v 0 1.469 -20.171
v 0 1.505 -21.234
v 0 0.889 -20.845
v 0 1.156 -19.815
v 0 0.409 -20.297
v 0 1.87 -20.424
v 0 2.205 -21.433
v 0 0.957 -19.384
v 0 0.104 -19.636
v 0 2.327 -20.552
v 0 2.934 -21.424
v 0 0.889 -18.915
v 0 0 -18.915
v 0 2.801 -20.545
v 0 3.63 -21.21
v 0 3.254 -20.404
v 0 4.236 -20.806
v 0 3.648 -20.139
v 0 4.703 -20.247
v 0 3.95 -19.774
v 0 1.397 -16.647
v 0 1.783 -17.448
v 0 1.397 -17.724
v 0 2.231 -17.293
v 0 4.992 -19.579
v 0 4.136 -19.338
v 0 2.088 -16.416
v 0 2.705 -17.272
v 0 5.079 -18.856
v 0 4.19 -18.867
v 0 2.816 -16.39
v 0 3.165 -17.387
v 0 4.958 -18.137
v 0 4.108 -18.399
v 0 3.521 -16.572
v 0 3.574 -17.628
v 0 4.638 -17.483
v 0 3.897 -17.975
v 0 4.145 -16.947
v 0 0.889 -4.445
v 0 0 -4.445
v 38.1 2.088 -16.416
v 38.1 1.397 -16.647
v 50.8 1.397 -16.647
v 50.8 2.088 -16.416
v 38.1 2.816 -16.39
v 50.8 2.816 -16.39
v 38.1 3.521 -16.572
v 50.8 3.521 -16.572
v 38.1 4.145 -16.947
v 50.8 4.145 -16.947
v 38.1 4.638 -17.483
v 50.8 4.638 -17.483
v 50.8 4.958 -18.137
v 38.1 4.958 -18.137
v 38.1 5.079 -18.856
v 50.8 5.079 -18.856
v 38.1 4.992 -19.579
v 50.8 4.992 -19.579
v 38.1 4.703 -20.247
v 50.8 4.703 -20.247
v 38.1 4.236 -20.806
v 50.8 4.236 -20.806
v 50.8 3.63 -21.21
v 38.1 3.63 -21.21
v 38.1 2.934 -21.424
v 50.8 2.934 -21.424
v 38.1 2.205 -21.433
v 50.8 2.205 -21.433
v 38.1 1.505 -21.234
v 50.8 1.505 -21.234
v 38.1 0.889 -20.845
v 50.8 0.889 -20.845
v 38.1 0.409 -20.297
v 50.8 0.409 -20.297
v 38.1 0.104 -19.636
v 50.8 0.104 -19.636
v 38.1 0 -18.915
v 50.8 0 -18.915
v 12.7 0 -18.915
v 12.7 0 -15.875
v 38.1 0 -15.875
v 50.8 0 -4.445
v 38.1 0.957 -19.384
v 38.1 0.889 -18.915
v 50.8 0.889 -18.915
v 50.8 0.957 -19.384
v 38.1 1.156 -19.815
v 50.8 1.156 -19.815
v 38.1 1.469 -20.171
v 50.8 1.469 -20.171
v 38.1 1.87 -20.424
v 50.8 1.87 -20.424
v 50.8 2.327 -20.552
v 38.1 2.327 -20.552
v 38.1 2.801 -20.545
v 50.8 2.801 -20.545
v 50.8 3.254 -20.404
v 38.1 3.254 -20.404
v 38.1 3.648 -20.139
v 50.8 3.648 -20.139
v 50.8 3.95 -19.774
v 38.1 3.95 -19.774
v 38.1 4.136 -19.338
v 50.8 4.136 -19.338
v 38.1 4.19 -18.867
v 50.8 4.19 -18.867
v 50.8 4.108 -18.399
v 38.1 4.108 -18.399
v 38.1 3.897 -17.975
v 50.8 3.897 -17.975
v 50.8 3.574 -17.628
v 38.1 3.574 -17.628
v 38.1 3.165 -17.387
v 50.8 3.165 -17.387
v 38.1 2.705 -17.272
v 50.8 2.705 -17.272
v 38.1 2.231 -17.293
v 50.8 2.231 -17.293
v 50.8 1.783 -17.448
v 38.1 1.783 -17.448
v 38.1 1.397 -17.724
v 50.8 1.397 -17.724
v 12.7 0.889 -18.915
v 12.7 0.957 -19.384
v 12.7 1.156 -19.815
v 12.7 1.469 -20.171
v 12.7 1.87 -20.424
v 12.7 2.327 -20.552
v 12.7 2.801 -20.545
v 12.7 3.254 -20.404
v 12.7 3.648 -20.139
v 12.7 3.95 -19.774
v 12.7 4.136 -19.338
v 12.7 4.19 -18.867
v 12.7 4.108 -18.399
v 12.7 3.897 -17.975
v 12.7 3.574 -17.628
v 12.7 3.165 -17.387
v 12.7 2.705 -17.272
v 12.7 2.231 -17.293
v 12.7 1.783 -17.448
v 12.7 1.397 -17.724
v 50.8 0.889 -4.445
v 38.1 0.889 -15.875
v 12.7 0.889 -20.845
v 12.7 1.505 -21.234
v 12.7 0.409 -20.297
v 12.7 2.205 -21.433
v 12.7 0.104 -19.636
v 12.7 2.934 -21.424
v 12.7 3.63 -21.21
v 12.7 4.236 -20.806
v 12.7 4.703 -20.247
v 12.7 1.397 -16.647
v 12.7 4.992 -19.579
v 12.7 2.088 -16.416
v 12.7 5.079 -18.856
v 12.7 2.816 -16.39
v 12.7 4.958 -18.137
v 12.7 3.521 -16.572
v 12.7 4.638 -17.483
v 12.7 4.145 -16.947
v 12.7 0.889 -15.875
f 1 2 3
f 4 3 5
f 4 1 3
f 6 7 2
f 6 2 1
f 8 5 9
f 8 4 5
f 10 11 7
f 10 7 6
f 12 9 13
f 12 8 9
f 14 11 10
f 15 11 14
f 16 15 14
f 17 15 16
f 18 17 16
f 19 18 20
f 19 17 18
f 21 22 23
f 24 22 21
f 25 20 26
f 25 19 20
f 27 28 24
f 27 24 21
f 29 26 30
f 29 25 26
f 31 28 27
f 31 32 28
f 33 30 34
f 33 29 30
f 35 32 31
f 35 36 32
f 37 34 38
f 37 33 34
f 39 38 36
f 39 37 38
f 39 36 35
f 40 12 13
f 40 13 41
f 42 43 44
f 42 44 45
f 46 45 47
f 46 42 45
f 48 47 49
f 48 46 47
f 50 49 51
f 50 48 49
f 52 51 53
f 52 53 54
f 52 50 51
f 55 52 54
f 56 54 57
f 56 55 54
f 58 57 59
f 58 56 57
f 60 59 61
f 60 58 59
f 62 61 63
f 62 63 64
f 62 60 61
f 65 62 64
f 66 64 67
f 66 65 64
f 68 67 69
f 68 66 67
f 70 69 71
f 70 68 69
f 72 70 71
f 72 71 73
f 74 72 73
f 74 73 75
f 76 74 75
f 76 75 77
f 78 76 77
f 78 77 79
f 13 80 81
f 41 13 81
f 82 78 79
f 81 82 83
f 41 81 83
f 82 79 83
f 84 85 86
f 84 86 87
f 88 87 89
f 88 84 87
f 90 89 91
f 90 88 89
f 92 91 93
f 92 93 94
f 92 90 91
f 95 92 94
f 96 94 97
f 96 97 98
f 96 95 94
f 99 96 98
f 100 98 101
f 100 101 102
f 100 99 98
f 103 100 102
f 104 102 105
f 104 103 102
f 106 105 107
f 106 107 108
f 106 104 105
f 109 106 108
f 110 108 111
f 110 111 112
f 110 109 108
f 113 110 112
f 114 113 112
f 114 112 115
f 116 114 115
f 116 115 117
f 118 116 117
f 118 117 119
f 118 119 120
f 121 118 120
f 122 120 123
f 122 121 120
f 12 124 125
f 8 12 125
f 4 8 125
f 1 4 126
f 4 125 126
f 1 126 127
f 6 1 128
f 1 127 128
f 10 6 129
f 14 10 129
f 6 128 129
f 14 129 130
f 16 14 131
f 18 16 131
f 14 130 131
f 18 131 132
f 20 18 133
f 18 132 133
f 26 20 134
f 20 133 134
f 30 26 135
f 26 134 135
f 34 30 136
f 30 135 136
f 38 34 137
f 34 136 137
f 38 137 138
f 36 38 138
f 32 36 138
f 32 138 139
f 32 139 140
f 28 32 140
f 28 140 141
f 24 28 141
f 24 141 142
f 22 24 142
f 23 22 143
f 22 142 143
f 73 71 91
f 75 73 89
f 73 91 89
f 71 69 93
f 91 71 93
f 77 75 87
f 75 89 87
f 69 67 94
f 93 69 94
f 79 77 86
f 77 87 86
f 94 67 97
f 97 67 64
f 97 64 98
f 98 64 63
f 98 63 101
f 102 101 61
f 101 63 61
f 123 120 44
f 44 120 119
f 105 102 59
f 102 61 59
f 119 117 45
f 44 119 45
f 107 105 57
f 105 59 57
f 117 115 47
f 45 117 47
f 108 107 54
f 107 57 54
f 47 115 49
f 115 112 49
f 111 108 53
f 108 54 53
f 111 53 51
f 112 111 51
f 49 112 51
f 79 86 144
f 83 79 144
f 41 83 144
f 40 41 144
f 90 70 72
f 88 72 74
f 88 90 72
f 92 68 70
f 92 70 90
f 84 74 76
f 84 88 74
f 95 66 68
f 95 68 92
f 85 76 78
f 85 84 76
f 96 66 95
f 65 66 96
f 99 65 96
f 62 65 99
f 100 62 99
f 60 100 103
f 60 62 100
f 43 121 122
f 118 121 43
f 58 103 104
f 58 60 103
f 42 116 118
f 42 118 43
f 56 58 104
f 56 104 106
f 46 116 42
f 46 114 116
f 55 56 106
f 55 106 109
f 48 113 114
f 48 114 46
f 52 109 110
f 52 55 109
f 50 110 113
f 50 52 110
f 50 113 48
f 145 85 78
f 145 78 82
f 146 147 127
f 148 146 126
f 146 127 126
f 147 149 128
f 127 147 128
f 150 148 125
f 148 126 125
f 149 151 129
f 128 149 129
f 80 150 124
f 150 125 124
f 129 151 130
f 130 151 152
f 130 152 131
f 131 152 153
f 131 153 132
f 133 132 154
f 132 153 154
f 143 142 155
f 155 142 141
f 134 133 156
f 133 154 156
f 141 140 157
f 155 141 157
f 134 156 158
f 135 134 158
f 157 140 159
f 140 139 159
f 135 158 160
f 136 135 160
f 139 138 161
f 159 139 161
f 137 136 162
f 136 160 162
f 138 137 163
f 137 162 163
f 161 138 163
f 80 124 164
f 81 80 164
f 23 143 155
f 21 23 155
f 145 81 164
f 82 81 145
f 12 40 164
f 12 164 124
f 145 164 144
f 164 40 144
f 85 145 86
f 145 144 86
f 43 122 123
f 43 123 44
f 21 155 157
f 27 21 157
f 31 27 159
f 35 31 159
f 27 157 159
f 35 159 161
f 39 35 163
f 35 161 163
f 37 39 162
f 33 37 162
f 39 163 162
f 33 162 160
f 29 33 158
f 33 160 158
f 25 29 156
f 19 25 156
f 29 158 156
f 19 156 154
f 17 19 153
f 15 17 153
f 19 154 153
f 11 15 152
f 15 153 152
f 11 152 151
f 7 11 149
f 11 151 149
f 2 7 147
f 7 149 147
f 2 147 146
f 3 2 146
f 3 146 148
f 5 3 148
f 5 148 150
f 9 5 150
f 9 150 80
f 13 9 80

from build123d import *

# Parameters (mm, degrees)
SKETCH1_W           = 50.8
SKETCH1_H           = 15.875
BOSS_EXTRUDE1_DEPTH = 0.889
SKETCH3_W           = 7.62
SKETCH3_H           = 12.7
CUT_EXTRUDE1_DEPTH  = 51.8
BOSS_EXTRUDE6_DEPTH = 12.7
BOSS_EXTRUDE7_START = -25.4
BOSS_EXTRUDE7_DEPTH = 12.7


with BuildPart() as part:
    # Sketch1 → Boss-Extrude1 (new body)
    with BuildSketch(Plane(origin=(0, 0, 0), x_dir=(1, 0, 0), z_dir=(0, 1, 0))):
        with Locations((25.4, 7.9375)):
            Rectangle(SKETCH1_W, SKETCH1_H)
    extrude(amount=BOSS_EXTRUDE1_DEPTH)

    # Sketch3 → Cut-Extrude1 (cut, through all)
    with BuildSketch(Plane(origin=(50.8, 0, 0), x_dir=(0, 0, -1), z_dir=(1, 0, 0))):
        with Locations((0.635, -0.009678267)):
            Rectangle(SKETCH3_W, SKETCH3_H)
    extrude(amount=-CUT_EXTRUDE1_DEPTH, mode=Mode.SUBTRACT)

    # Sketch4 → Boss-Extrude6 (add)
    with BuildSketch(Plane(origin=(38.1, 0, 0), x_dir=(0, 0, -1), z_dir=(1, 0, 0))):
        with BuildLine():
            Line((15.875, 0.889), (18.915054155, 0.889))
            ThreePointArc((18.915054155, 0.889), (19.562629634, 4.058699114), (17.723688552, 1.397))
            Line((17.723688552, 1.397), (16.646761626, 1.397))
            ThreePointArc((16.646761626, 1.397), (20.247041392, 4.702732068), (18.915054155, 0))
            Line((18.915054155, 0), (15.875, 0))
            Line((15.875, 0), (15.875, 0.889))
        make_face()
    extrude(amount=BOSS_EXTRUDE6_DEPTH)

    # Sketch4<4> → Boss-Extrude7 (add)
    with BuildSketch(Plane(origin=(38.1, 0, 0), x_dir=(0, 0, -1), z_dir=(1, 0, 0)).offset(BOSS_EXTRUDE7_START)):
        with BuildLine():
            Line((15.875, 0.889), (18.915054155, 0.889))
            ThreePointArc((18.915054155, 0.889), (19.562629634, 4.058699114), (17.723688552, 1.397))
            Line((17.723688552, 1.397), (16.646761626, 1.397))
            ThreePointArc((16.646761626, 1.397), (20.247041392, 4.702732068), (18.915054155, 0))
            Line((18.915054155, 0), (15.875, 0))
            Line((15.875, 0), (15.875, 0.889))
        make_face()
    extrude(amount=-BOSS_EXTRUDE7_DEPTH)


solid = part.part
